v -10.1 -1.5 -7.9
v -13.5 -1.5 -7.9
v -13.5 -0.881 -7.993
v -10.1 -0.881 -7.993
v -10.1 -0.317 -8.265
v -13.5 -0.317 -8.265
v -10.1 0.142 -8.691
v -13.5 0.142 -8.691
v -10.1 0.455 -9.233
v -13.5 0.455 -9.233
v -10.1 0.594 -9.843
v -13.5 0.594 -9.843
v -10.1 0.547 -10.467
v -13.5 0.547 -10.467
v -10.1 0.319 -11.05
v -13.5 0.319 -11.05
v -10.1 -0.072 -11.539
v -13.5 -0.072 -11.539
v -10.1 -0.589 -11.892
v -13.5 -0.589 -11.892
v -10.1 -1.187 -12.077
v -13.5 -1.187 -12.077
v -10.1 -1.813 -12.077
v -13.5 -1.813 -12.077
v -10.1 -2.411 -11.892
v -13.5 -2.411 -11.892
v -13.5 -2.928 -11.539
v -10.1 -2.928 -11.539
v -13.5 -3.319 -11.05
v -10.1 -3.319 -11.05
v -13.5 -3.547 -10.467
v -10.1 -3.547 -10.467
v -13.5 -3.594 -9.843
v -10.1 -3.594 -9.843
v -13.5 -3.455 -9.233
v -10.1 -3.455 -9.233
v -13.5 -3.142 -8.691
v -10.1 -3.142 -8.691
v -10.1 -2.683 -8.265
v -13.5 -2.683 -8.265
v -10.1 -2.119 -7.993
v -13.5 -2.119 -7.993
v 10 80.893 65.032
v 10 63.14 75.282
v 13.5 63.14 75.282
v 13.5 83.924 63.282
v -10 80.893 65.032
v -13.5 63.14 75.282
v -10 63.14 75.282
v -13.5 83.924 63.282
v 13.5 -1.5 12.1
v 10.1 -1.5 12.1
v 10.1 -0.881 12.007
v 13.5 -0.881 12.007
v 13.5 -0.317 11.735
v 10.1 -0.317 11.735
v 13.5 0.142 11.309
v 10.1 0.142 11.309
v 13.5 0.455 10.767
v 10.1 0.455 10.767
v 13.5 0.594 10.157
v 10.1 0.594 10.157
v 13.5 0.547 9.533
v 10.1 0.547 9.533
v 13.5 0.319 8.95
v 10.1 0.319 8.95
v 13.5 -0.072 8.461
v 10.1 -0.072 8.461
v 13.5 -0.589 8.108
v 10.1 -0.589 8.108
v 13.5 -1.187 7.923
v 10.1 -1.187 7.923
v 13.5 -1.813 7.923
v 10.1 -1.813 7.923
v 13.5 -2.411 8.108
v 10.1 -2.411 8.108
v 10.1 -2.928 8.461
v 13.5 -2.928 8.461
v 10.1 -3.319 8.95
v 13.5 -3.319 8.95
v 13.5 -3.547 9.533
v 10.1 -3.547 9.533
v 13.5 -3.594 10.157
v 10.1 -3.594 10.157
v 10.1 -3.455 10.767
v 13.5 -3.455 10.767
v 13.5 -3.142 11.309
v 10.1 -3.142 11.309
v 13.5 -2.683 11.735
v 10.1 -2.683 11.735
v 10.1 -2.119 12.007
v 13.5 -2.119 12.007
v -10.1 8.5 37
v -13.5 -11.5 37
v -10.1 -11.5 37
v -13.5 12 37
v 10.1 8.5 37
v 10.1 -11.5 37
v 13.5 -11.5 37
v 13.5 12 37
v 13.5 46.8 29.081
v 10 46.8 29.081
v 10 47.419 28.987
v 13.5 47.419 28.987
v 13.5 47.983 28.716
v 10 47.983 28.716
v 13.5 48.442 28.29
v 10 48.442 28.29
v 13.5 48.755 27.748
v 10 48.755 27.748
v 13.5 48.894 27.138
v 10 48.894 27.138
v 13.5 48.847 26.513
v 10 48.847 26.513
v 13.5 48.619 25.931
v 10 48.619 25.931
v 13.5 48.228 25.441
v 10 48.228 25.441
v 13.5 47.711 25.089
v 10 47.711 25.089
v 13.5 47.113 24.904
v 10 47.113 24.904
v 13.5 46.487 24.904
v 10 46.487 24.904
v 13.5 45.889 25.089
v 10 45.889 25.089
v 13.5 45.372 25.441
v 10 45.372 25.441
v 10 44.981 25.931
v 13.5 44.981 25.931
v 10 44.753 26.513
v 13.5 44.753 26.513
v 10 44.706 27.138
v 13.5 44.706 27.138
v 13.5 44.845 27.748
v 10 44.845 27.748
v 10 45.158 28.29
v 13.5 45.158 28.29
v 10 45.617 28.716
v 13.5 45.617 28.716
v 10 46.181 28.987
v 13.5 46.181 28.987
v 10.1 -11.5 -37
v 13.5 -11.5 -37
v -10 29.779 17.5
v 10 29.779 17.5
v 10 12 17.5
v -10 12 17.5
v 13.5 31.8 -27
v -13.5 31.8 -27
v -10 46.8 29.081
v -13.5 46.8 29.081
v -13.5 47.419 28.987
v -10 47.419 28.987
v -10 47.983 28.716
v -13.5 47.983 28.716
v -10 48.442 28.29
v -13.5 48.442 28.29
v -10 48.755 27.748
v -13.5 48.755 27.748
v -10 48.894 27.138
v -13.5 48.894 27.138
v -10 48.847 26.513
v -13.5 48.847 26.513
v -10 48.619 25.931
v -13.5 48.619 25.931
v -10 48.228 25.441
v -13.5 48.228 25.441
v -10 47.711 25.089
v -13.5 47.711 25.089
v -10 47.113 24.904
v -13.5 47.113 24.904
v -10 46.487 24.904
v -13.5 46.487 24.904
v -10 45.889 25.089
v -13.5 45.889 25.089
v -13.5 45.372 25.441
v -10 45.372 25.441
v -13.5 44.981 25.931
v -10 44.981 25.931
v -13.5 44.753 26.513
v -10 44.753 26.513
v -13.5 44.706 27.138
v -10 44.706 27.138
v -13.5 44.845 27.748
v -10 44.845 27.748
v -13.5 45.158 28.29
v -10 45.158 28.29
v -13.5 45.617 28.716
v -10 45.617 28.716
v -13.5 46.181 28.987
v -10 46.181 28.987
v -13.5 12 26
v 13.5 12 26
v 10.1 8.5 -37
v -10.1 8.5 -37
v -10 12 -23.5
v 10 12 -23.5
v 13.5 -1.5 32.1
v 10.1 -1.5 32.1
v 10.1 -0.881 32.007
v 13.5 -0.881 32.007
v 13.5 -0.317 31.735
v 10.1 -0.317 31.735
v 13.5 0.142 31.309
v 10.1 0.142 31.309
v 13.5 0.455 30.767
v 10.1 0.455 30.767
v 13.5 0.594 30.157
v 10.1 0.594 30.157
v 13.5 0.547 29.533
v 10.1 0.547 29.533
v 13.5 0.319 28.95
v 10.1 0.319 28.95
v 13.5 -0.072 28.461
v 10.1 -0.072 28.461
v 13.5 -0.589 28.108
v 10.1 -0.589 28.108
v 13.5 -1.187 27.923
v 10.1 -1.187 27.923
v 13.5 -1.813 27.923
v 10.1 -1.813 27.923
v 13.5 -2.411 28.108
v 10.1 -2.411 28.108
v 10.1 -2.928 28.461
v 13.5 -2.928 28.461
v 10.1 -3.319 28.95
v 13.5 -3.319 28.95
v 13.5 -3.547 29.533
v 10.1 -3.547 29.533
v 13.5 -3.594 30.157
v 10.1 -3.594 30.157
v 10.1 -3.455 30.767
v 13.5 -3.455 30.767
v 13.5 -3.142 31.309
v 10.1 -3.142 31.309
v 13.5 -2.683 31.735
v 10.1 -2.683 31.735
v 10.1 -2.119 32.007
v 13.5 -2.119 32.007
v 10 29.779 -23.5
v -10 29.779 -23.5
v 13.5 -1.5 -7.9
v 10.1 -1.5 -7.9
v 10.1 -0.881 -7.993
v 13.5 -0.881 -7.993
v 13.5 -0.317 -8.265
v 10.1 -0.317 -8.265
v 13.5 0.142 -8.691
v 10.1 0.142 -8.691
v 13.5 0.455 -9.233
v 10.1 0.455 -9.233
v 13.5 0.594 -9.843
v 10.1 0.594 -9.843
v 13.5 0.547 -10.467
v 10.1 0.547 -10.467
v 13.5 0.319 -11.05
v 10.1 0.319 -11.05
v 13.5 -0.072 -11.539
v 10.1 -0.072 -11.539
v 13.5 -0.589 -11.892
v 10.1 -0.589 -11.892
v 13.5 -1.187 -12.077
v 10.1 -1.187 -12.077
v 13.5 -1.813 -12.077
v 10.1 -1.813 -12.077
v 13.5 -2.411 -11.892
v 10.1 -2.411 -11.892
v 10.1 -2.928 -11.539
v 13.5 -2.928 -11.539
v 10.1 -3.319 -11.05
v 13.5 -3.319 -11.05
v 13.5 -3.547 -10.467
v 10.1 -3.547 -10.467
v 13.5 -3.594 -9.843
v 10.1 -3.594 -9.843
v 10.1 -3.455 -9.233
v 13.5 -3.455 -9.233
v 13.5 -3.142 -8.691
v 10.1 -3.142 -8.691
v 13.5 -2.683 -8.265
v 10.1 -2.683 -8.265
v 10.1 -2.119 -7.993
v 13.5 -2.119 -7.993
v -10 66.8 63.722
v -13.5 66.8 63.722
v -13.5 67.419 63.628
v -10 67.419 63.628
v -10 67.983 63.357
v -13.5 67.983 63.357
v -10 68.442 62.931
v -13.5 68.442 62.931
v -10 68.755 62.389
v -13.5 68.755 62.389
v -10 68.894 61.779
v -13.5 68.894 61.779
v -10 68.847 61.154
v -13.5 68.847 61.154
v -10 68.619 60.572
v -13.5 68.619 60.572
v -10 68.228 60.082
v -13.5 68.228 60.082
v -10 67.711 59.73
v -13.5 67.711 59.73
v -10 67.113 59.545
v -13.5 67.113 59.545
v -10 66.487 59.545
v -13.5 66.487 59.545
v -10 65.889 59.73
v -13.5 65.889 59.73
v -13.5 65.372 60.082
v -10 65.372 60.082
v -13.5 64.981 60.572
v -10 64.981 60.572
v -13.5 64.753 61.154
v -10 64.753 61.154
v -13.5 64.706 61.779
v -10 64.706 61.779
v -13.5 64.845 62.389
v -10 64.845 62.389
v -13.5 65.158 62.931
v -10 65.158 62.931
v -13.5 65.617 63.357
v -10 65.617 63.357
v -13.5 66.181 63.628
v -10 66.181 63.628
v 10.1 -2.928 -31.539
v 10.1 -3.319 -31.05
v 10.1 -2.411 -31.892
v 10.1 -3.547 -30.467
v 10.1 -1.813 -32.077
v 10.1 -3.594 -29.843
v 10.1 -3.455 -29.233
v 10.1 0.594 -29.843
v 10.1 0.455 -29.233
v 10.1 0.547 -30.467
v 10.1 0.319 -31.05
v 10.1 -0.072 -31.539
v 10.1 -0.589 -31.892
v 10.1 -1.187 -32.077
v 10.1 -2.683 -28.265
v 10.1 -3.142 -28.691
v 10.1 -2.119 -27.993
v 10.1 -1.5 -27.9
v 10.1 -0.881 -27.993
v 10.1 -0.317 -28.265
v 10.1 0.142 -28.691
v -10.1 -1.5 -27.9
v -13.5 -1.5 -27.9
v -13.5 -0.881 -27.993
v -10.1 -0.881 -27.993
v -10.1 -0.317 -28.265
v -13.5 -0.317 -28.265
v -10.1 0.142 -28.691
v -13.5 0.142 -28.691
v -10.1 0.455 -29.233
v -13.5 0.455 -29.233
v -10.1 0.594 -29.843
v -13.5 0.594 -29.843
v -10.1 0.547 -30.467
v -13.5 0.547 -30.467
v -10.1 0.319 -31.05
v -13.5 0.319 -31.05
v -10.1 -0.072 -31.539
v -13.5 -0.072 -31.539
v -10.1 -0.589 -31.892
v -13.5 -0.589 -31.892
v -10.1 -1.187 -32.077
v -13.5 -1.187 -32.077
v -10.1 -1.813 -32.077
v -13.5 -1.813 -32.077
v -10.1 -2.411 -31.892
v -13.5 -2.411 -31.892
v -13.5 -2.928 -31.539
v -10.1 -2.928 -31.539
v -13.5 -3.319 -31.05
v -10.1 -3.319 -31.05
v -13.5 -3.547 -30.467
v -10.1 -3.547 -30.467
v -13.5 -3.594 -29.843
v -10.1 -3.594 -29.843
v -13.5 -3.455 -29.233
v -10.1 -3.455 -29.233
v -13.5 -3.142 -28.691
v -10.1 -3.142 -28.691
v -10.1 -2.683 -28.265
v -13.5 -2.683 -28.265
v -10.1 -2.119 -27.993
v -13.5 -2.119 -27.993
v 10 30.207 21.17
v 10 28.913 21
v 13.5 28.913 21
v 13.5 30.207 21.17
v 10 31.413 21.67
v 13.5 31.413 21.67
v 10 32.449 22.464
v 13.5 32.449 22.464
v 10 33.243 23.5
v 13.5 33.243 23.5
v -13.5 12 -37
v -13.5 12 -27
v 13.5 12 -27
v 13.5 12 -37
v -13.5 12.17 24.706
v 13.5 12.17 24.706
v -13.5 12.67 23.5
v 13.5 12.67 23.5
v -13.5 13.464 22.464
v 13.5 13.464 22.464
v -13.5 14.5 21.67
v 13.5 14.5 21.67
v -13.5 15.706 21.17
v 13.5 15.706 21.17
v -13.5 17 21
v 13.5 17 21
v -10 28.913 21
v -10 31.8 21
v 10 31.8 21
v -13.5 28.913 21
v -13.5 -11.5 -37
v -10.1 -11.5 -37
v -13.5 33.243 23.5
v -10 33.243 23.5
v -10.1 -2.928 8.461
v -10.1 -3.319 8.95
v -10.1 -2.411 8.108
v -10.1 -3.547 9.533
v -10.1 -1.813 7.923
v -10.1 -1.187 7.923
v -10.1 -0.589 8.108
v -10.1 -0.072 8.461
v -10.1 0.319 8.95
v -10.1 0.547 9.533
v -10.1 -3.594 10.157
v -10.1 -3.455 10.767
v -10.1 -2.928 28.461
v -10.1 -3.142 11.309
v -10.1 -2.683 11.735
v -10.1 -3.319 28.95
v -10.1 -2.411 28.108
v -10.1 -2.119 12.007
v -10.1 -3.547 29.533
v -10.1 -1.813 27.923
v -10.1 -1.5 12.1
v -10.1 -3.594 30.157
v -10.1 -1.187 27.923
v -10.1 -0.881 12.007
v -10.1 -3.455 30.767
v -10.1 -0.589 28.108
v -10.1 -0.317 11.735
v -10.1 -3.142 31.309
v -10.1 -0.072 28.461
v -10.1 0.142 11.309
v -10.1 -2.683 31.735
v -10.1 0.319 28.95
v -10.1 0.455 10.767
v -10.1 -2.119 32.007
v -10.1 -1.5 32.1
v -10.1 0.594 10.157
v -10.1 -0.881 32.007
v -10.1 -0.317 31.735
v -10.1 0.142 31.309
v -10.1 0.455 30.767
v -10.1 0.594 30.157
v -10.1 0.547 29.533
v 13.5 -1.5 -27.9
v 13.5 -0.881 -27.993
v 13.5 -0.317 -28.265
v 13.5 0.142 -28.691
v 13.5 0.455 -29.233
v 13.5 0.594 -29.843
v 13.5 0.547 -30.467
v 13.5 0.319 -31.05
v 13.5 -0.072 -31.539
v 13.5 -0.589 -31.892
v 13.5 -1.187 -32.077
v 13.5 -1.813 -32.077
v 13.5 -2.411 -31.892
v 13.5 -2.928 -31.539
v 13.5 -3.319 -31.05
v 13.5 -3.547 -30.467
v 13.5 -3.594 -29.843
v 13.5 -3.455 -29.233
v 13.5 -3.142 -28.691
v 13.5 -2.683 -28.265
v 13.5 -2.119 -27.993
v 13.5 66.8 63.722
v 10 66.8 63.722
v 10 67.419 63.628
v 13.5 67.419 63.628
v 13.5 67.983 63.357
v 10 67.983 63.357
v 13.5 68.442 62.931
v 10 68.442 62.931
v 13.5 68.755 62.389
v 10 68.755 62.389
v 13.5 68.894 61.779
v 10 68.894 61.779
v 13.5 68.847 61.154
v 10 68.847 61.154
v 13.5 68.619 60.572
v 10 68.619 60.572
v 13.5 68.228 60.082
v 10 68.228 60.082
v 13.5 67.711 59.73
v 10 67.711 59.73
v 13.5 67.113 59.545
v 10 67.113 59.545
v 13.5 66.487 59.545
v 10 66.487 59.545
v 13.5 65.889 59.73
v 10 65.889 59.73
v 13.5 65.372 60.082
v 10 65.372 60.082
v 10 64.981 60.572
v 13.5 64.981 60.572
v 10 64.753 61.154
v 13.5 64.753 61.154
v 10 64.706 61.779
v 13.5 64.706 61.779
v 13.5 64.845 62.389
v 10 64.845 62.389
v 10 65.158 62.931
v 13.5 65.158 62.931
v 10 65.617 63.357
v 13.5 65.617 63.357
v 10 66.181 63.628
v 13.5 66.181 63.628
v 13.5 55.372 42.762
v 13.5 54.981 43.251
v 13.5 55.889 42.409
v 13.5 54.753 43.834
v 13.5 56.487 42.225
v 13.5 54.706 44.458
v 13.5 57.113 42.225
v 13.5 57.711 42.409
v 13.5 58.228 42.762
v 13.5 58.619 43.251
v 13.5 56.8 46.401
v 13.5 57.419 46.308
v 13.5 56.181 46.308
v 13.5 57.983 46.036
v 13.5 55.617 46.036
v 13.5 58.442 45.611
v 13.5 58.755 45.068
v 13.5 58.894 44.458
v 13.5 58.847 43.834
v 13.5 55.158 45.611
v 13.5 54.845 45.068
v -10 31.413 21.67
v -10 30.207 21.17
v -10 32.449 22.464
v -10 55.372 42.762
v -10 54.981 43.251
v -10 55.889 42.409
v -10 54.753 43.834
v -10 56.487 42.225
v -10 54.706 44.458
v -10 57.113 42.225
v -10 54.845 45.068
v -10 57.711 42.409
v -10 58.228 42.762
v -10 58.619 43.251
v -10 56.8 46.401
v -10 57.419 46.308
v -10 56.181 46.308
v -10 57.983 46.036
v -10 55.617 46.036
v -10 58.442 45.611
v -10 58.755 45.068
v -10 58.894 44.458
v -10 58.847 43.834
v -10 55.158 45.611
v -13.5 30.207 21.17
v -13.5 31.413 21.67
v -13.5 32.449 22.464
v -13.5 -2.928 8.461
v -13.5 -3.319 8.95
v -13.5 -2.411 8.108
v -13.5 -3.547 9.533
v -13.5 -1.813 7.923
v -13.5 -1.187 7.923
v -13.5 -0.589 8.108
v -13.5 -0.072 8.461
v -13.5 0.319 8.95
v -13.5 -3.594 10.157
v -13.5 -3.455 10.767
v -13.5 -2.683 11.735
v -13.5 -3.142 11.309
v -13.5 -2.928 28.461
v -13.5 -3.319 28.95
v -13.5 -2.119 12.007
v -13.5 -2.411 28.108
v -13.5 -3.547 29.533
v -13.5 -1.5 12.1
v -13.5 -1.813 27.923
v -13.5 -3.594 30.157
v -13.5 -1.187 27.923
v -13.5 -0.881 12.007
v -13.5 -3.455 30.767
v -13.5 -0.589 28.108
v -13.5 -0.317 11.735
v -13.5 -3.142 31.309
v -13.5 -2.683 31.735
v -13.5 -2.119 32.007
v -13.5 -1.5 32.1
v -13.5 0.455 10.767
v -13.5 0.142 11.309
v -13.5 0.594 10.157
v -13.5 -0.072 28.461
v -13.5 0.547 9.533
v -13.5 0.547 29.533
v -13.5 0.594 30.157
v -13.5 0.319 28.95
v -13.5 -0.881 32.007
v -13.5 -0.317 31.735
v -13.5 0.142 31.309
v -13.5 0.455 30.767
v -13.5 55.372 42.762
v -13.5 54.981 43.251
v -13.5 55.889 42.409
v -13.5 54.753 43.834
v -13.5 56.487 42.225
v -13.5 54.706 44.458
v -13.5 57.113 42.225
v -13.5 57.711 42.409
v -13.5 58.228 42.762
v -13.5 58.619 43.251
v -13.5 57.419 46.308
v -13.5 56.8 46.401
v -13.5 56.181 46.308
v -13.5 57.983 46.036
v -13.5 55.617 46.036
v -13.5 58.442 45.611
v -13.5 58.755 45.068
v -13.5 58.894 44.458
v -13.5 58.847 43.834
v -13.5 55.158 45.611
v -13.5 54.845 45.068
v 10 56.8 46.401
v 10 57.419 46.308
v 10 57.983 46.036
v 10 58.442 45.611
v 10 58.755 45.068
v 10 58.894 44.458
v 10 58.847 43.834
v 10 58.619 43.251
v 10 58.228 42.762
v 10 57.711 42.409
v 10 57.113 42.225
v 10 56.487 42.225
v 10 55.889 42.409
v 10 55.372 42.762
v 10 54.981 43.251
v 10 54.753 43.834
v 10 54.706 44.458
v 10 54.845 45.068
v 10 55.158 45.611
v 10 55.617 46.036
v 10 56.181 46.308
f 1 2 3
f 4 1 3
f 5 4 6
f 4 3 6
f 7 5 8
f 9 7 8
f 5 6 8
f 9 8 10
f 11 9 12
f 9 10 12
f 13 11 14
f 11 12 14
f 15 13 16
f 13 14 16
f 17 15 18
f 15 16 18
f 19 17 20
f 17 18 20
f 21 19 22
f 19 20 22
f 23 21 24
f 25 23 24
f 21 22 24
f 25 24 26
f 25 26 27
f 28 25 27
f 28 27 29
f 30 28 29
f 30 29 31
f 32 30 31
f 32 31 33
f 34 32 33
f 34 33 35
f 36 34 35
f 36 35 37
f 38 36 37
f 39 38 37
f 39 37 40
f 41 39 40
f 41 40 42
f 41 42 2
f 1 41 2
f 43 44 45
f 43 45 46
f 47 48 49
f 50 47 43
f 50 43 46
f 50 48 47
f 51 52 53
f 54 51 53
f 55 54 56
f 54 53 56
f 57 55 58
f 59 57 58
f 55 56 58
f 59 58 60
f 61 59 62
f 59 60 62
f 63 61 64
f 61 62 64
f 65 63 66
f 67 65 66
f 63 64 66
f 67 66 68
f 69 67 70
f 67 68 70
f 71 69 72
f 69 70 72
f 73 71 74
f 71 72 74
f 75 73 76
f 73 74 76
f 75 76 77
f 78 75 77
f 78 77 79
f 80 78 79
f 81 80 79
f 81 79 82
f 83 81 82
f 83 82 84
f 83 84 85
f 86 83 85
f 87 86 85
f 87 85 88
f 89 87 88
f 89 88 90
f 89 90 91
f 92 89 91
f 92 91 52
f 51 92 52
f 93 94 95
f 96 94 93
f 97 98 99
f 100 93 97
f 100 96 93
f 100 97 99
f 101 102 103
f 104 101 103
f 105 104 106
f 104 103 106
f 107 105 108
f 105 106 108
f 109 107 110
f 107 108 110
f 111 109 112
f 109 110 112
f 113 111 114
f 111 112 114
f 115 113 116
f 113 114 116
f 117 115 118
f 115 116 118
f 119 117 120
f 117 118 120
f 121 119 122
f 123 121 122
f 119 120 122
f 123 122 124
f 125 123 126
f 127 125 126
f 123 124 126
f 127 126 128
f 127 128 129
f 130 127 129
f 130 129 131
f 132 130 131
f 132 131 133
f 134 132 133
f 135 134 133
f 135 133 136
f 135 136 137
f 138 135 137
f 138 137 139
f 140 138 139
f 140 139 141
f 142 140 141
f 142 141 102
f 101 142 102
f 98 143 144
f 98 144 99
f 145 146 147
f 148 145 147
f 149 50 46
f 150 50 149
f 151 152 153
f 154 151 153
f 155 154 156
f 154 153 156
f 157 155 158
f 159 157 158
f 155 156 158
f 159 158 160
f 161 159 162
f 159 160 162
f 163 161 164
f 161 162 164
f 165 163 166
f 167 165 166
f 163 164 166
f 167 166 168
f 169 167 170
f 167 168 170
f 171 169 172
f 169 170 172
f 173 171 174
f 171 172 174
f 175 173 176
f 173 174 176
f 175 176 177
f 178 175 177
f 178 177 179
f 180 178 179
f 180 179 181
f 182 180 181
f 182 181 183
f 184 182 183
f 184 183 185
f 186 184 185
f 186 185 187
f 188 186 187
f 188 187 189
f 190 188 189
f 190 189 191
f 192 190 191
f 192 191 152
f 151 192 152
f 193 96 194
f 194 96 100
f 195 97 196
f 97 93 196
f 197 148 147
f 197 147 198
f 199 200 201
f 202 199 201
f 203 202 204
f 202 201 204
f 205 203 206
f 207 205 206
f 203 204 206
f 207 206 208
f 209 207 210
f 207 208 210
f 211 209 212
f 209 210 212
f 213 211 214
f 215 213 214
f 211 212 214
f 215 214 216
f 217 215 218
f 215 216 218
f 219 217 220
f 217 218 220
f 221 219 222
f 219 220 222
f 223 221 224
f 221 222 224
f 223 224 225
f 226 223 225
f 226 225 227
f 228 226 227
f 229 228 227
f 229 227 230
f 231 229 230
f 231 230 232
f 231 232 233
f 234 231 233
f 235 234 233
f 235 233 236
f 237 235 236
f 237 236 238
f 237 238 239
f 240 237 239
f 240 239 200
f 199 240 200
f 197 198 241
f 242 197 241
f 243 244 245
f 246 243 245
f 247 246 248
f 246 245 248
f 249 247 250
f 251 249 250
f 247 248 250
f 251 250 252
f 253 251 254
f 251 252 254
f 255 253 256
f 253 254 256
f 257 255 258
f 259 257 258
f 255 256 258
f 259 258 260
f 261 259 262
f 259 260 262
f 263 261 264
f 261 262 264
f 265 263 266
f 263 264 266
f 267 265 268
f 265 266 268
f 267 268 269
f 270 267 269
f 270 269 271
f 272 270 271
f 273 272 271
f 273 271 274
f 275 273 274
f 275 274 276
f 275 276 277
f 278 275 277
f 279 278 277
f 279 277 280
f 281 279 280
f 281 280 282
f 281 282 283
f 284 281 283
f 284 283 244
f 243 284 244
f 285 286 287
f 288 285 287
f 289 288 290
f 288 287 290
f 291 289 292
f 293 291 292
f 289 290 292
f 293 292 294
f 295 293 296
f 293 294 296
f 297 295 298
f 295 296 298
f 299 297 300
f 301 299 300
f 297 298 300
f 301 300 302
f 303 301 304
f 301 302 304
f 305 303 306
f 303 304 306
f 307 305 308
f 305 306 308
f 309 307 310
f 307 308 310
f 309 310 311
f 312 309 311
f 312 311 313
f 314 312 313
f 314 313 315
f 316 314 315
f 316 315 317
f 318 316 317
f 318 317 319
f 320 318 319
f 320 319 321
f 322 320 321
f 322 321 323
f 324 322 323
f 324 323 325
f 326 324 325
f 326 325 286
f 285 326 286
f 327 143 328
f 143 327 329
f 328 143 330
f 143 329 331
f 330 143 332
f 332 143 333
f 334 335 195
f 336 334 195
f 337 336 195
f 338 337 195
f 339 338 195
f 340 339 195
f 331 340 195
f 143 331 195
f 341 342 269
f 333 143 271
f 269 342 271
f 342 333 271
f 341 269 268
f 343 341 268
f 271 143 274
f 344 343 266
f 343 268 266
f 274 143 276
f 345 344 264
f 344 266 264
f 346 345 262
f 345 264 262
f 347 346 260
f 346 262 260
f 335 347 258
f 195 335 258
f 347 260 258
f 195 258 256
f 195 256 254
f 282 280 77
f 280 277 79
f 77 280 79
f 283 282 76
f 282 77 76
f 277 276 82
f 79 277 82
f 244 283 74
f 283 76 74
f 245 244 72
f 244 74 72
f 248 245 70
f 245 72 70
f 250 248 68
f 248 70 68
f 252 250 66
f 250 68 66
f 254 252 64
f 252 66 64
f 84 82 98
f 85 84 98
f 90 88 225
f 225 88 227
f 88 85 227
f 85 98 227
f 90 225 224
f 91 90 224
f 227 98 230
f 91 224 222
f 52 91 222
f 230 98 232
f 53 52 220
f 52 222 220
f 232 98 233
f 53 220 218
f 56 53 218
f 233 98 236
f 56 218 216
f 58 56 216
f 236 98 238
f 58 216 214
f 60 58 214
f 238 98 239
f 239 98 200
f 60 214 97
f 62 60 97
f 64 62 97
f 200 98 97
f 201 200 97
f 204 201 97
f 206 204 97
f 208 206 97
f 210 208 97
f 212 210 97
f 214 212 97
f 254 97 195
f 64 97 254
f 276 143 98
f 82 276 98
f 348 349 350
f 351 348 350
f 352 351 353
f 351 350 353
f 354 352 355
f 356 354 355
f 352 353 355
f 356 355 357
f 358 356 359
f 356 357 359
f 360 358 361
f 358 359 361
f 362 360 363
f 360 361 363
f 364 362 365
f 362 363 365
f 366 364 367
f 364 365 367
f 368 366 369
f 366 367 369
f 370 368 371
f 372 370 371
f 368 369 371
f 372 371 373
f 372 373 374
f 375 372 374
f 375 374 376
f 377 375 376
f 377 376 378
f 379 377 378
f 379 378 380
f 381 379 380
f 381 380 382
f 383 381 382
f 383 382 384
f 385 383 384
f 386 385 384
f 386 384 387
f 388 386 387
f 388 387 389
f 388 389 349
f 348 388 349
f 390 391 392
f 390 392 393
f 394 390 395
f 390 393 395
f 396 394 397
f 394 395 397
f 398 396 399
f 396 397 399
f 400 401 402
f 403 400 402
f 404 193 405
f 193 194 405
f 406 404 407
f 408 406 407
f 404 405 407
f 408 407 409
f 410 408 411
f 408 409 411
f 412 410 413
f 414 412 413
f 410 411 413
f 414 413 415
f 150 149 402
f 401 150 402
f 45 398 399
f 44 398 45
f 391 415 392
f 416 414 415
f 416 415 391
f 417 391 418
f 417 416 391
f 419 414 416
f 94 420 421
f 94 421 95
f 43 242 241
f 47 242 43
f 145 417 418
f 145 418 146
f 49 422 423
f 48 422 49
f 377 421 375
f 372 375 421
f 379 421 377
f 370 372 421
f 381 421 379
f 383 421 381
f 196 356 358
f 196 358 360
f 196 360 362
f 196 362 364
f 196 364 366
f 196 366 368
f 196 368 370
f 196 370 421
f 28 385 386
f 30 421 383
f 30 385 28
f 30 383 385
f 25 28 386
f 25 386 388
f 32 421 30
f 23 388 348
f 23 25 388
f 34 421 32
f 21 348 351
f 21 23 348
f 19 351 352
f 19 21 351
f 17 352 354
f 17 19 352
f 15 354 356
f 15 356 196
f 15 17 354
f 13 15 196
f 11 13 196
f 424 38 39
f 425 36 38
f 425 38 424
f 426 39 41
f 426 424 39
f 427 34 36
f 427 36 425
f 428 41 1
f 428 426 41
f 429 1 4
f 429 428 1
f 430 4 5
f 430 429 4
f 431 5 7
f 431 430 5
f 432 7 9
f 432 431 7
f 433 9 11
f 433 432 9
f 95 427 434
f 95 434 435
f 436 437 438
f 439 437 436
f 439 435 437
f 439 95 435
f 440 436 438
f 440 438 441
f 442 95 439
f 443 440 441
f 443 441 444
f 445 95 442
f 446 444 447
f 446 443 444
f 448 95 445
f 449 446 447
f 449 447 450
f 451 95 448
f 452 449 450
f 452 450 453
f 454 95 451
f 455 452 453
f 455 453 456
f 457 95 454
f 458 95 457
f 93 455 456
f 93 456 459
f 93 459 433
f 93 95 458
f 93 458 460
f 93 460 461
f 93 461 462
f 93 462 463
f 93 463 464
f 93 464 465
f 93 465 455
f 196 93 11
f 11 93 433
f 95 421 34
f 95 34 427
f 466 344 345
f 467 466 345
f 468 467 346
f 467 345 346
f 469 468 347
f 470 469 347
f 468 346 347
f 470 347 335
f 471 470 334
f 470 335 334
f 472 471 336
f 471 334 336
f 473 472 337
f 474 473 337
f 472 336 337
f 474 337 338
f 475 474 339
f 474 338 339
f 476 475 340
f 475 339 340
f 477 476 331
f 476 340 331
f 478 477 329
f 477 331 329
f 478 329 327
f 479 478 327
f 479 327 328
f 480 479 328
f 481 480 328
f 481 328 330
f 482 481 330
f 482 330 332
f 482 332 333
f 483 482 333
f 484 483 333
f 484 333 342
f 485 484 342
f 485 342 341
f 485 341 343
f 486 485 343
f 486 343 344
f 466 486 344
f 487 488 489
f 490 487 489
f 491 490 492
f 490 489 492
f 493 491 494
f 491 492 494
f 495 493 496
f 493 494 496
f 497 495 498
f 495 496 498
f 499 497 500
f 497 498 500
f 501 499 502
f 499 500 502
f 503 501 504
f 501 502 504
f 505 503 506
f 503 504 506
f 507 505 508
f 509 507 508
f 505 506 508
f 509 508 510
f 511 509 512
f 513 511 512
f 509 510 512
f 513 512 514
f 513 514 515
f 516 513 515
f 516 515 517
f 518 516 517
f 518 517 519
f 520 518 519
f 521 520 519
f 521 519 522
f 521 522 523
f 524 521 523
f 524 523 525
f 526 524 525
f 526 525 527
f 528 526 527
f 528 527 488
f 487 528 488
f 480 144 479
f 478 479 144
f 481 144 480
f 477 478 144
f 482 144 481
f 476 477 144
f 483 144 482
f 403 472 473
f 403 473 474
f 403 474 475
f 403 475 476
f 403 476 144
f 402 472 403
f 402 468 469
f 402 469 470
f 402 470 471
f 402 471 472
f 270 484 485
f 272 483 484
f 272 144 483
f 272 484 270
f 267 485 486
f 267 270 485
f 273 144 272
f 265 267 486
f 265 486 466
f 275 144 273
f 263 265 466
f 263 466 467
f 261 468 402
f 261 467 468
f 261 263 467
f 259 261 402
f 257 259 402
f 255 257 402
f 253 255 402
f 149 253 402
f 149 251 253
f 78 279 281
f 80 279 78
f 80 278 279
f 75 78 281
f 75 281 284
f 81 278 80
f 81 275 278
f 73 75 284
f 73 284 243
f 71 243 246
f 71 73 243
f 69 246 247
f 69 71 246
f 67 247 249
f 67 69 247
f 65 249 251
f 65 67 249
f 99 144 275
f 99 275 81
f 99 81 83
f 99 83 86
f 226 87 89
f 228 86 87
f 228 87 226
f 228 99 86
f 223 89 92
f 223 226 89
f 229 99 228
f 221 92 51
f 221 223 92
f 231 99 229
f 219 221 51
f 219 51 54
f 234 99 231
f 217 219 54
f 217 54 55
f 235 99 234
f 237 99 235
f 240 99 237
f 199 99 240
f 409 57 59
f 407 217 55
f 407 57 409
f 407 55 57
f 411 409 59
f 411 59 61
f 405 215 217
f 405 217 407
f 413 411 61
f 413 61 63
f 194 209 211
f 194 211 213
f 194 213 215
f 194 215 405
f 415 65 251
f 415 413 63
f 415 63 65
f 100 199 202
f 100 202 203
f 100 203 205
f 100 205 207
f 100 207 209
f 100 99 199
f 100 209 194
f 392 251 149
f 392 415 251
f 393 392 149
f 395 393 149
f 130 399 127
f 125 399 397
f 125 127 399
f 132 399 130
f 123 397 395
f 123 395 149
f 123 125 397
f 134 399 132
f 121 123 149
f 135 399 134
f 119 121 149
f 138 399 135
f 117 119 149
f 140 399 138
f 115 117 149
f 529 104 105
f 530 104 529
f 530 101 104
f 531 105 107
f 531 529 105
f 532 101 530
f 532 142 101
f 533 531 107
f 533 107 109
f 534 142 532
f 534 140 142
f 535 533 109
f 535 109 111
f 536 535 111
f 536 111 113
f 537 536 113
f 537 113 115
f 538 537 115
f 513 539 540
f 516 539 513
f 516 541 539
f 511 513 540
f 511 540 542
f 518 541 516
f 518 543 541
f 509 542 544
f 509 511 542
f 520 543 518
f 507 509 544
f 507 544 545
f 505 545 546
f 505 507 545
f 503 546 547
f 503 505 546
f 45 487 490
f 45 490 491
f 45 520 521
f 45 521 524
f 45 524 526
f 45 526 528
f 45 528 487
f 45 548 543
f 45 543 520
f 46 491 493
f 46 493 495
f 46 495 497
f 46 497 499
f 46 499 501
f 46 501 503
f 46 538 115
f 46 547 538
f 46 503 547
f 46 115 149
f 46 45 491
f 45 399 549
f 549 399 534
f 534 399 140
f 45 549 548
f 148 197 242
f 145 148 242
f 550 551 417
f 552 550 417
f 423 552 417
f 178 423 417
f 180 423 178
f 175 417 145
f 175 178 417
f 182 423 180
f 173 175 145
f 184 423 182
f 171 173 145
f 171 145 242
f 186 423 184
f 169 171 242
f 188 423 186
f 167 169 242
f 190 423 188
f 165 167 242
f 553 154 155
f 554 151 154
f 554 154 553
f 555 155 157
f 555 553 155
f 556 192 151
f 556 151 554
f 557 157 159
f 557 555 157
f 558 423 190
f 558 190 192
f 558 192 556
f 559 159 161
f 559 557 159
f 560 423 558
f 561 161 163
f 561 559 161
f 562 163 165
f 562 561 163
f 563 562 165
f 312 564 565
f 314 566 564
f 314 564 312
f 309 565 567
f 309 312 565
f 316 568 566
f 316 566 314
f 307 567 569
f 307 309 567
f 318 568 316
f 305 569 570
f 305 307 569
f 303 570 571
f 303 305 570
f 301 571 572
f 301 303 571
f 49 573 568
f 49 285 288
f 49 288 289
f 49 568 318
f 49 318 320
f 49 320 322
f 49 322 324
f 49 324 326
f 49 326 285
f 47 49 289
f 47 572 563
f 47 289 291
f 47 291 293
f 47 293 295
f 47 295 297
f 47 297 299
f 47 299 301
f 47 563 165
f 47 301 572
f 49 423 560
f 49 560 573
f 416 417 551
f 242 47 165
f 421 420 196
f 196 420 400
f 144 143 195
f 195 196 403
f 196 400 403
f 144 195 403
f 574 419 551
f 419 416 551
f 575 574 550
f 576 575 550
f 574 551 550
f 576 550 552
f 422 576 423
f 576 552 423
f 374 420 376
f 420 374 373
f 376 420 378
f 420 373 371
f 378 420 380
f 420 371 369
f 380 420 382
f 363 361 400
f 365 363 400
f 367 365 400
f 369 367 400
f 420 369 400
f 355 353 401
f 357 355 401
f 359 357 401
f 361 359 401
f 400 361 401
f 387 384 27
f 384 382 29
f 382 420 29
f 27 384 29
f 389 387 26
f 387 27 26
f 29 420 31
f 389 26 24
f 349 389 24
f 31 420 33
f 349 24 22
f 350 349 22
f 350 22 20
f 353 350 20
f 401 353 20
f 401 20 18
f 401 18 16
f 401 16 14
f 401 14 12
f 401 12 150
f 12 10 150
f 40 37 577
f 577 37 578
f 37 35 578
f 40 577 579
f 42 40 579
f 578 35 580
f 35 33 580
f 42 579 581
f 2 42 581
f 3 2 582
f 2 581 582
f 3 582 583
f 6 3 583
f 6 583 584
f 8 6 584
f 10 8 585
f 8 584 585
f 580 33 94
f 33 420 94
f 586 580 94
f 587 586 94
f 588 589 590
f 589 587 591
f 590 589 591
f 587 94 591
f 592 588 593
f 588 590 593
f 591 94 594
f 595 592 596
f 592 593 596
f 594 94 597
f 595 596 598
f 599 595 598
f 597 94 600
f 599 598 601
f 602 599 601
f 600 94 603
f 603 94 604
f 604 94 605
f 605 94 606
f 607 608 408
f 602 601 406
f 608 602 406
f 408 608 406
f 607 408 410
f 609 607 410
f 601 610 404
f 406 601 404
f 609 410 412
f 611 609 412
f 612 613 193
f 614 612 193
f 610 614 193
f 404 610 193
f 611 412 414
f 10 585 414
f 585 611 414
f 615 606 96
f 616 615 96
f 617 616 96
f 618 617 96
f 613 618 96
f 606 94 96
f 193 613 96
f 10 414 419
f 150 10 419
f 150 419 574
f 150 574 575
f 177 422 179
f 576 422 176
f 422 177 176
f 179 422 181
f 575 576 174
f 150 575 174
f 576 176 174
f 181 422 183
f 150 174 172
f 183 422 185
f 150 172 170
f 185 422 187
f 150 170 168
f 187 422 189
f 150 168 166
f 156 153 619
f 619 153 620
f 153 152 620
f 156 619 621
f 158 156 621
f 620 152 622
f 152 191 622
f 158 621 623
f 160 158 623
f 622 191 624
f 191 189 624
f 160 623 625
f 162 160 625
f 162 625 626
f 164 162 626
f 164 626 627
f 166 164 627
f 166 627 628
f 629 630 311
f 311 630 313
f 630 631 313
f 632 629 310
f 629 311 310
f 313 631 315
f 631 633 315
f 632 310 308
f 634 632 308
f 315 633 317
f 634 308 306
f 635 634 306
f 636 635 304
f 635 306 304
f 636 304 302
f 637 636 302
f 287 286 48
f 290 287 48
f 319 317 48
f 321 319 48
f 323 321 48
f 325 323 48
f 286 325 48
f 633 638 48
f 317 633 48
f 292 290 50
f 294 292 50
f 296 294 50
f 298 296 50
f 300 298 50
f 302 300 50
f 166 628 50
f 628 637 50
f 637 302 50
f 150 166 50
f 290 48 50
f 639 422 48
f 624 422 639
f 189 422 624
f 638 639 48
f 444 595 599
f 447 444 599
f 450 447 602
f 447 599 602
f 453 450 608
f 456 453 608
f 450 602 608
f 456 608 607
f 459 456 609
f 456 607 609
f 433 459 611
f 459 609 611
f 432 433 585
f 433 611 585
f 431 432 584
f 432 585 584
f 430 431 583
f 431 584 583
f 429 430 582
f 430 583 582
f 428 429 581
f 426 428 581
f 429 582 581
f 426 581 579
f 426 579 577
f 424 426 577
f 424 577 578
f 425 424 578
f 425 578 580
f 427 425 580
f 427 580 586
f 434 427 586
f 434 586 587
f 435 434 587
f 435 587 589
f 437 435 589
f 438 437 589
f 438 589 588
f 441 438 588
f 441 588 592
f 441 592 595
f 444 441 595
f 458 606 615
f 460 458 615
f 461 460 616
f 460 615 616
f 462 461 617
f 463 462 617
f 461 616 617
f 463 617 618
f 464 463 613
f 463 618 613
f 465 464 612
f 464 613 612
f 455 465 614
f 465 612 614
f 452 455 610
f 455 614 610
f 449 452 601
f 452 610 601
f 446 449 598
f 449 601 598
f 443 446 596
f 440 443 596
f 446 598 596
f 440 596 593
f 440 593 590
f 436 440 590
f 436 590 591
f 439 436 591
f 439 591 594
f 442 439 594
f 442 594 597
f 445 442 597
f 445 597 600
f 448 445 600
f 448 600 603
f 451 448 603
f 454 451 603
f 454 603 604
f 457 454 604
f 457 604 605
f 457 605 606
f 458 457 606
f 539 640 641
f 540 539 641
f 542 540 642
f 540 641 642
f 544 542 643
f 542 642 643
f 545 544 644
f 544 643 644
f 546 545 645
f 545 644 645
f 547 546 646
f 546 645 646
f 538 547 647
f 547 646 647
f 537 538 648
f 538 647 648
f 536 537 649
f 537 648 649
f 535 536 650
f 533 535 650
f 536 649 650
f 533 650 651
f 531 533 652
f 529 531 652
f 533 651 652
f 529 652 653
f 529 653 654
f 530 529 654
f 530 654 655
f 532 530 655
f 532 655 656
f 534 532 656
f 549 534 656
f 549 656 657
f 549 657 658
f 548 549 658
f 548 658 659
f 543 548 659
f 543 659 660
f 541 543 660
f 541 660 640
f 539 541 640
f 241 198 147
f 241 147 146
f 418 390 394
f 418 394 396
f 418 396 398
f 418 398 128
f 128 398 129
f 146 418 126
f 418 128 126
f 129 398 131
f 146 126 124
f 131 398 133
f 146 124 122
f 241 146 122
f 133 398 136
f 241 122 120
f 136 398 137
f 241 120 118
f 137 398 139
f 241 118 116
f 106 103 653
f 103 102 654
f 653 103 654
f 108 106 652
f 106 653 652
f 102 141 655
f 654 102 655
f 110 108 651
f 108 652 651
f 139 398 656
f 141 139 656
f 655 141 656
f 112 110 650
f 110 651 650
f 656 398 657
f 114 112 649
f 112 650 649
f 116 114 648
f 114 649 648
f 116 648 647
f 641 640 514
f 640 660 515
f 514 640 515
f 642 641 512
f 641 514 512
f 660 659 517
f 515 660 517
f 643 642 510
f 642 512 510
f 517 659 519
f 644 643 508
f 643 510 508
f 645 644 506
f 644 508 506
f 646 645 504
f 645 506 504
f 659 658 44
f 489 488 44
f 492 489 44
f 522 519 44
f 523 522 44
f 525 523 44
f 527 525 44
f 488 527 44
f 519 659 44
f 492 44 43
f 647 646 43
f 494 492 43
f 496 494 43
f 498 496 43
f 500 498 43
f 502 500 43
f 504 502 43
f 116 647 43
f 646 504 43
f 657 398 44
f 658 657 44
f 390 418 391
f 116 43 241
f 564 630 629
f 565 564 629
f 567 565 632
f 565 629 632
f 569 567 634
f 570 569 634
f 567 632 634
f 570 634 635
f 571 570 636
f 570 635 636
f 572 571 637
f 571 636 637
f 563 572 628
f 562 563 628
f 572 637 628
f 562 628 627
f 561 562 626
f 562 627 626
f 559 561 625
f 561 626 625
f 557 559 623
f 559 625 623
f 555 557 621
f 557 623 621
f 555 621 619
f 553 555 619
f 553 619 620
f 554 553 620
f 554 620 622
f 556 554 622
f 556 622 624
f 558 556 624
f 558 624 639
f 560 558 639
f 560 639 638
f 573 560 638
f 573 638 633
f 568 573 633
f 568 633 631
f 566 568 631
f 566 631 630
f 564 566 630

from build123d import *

# Parameters (mm, degrees)
SKETCH1_W           = 27
SKETCH1_H           = 24
BOSS_EXTRUDE1_DEPTH = 37
SHELL1_T            = -3.5
BOSS_EXTRUDE2_DEPTH = 27
SHELL2_START        = -10
SHELL2_DEPTH        = 20
SKETCH3_R           = 2.1
CUT_EXTRUDE1_DEPTH  = 116.92964185
MOVE_FACE1_BY       = 0.1
MOVE_FACE1_2_BY     = 0.1
SKETCH4_R           = 2.1
CUT_EXTRUDE2_DEPTH  = 116.92964185
FILLET1_R           = 5
SKETCH5_W           = 74
SKETCH5_H           = 0.5
CUT_EXTRUDE3_DEPTH  = 116.92964185


# Read off the part's stored shape, not the designer's step: Shell2
with BuildPart() as part:
    # Sketch1 → Boss-Extrude1 (new, symmetric)
    with BuildSketch(Plane.XY):
        Rectangle(SKETCH1_W, SKETCH1_H)
    extrude(amount=BOSS_EXTRUDE1_DEPTH, both=True)

    # Shell1
    shell1_openings = [part.faces().sort_by_distance(p)[0] for p in [
        (0, 0, 37),
        (0, 0, -37),
        (0, -12, 0),
    ]]
    offset(amount=SHELL1_T, openings=shell1_openings, kind=Kind.INTERSECTION)

    # Sketch2 → Boss-Extrude2 (add)
    with BuildSketch(Plane.ZY.offset(13.5)):
        Polygon((63.282032303, 83.924355653), (-27, 31.8), (-27, 12), (21, 12), (21, 31.8), (75.282032303, 63.139745962), align=None)
    extrude(amount=-BOSS_EXTRUDE2_DEPTH)

    # Shell2 outline → Shell2 (cut)
    with BuildSketch(Plane.YZ.offset(SHELL2_START)):
        Polygon((29.779274058, 17.5), (12, 17.5), (12, -23.5), (29.779274058, -23.5), (80.89326674, 65.032032303), (63.139745962, 75.282032303), (31.8, 21), align=None)
    extrude(amount=SHELL2_DEPTH, mode=Mode.SUBTRACT)

    # Sketch3 → Cut-Extrude1 (cut, through all)
    with BuildSketch(Plane.ZY.offset(13.5)):
        with Locations((-30, -1.5)):
            Circle(SKETCH3_R)
        with Locations((-10, -1.5)):
            Circle(SKETCH3_R)
        with Locations((10, -1.5)):
            Circle(SKETCH3_R)
        with Locations((30, -1.5)):
            Circle(SKETCH3_R)
    extrude(amount=-CUT_EXTRUDE1_DEPTH, mode=Mode.SUBTRACT)

    # Move Face1: a face moved inward by 0.1
    extrude(part.faces().sort_by_distance((10, -1.759479058, 0))[0], amount=MOVE_FACE1_BY, dir=(1, 0, 0), mode=Mode.SUBTRACT)

    # Move Face1 2: a face moved inward by 0.1
    extrude(part.faces().sort_by_distance((-10, -1.759479058, 0))[0], amount=MOVE_FACE1_2_BY, dir=(-1, 0, 0), mode=Mode.SUBTRACT)

    # Sketch4 → Cut-Extrude2 (cut, through all)
    with BuildSketch(Plane.ZY.offset(13.5)):
        with Locations((61.621778265, 66.8)):
            Circle(SKETCH4_R)
        with Locations((44.301270189, 56.8)):
            Circle(SKETCH4_R)
        with Locations((26.980762114, 46.8)):
            Circle(SKETCH4_R)
    extrude(amount=-CUT_EXTRUDE2_DEPTH, mode=Mode.SUBTRACT)

    # Fillet1
    fillet1_edges = [part.edges().sort_by_distance(p)[0] for p in [
        (11.75, 31.8, 21),
        (0, 12, 21),
        (-11.75, 31.8, 21),
    ]]
    fillet(fillet1_edges, radius=FILLET1_R)

    # Sketch5 → Cut-Extrude3 (cut, through all)
    with BuildSketch(Plane.ZY.offset(13.5)):
        with Locations((0, -11.75)):
            Rectangle(SKETCH5_W, SKETCH5_H)
    extrude(amount=-CUT_EXTRUDE3_DEPTH, mode=Mode.SUBTRACT)


solid = part.part
